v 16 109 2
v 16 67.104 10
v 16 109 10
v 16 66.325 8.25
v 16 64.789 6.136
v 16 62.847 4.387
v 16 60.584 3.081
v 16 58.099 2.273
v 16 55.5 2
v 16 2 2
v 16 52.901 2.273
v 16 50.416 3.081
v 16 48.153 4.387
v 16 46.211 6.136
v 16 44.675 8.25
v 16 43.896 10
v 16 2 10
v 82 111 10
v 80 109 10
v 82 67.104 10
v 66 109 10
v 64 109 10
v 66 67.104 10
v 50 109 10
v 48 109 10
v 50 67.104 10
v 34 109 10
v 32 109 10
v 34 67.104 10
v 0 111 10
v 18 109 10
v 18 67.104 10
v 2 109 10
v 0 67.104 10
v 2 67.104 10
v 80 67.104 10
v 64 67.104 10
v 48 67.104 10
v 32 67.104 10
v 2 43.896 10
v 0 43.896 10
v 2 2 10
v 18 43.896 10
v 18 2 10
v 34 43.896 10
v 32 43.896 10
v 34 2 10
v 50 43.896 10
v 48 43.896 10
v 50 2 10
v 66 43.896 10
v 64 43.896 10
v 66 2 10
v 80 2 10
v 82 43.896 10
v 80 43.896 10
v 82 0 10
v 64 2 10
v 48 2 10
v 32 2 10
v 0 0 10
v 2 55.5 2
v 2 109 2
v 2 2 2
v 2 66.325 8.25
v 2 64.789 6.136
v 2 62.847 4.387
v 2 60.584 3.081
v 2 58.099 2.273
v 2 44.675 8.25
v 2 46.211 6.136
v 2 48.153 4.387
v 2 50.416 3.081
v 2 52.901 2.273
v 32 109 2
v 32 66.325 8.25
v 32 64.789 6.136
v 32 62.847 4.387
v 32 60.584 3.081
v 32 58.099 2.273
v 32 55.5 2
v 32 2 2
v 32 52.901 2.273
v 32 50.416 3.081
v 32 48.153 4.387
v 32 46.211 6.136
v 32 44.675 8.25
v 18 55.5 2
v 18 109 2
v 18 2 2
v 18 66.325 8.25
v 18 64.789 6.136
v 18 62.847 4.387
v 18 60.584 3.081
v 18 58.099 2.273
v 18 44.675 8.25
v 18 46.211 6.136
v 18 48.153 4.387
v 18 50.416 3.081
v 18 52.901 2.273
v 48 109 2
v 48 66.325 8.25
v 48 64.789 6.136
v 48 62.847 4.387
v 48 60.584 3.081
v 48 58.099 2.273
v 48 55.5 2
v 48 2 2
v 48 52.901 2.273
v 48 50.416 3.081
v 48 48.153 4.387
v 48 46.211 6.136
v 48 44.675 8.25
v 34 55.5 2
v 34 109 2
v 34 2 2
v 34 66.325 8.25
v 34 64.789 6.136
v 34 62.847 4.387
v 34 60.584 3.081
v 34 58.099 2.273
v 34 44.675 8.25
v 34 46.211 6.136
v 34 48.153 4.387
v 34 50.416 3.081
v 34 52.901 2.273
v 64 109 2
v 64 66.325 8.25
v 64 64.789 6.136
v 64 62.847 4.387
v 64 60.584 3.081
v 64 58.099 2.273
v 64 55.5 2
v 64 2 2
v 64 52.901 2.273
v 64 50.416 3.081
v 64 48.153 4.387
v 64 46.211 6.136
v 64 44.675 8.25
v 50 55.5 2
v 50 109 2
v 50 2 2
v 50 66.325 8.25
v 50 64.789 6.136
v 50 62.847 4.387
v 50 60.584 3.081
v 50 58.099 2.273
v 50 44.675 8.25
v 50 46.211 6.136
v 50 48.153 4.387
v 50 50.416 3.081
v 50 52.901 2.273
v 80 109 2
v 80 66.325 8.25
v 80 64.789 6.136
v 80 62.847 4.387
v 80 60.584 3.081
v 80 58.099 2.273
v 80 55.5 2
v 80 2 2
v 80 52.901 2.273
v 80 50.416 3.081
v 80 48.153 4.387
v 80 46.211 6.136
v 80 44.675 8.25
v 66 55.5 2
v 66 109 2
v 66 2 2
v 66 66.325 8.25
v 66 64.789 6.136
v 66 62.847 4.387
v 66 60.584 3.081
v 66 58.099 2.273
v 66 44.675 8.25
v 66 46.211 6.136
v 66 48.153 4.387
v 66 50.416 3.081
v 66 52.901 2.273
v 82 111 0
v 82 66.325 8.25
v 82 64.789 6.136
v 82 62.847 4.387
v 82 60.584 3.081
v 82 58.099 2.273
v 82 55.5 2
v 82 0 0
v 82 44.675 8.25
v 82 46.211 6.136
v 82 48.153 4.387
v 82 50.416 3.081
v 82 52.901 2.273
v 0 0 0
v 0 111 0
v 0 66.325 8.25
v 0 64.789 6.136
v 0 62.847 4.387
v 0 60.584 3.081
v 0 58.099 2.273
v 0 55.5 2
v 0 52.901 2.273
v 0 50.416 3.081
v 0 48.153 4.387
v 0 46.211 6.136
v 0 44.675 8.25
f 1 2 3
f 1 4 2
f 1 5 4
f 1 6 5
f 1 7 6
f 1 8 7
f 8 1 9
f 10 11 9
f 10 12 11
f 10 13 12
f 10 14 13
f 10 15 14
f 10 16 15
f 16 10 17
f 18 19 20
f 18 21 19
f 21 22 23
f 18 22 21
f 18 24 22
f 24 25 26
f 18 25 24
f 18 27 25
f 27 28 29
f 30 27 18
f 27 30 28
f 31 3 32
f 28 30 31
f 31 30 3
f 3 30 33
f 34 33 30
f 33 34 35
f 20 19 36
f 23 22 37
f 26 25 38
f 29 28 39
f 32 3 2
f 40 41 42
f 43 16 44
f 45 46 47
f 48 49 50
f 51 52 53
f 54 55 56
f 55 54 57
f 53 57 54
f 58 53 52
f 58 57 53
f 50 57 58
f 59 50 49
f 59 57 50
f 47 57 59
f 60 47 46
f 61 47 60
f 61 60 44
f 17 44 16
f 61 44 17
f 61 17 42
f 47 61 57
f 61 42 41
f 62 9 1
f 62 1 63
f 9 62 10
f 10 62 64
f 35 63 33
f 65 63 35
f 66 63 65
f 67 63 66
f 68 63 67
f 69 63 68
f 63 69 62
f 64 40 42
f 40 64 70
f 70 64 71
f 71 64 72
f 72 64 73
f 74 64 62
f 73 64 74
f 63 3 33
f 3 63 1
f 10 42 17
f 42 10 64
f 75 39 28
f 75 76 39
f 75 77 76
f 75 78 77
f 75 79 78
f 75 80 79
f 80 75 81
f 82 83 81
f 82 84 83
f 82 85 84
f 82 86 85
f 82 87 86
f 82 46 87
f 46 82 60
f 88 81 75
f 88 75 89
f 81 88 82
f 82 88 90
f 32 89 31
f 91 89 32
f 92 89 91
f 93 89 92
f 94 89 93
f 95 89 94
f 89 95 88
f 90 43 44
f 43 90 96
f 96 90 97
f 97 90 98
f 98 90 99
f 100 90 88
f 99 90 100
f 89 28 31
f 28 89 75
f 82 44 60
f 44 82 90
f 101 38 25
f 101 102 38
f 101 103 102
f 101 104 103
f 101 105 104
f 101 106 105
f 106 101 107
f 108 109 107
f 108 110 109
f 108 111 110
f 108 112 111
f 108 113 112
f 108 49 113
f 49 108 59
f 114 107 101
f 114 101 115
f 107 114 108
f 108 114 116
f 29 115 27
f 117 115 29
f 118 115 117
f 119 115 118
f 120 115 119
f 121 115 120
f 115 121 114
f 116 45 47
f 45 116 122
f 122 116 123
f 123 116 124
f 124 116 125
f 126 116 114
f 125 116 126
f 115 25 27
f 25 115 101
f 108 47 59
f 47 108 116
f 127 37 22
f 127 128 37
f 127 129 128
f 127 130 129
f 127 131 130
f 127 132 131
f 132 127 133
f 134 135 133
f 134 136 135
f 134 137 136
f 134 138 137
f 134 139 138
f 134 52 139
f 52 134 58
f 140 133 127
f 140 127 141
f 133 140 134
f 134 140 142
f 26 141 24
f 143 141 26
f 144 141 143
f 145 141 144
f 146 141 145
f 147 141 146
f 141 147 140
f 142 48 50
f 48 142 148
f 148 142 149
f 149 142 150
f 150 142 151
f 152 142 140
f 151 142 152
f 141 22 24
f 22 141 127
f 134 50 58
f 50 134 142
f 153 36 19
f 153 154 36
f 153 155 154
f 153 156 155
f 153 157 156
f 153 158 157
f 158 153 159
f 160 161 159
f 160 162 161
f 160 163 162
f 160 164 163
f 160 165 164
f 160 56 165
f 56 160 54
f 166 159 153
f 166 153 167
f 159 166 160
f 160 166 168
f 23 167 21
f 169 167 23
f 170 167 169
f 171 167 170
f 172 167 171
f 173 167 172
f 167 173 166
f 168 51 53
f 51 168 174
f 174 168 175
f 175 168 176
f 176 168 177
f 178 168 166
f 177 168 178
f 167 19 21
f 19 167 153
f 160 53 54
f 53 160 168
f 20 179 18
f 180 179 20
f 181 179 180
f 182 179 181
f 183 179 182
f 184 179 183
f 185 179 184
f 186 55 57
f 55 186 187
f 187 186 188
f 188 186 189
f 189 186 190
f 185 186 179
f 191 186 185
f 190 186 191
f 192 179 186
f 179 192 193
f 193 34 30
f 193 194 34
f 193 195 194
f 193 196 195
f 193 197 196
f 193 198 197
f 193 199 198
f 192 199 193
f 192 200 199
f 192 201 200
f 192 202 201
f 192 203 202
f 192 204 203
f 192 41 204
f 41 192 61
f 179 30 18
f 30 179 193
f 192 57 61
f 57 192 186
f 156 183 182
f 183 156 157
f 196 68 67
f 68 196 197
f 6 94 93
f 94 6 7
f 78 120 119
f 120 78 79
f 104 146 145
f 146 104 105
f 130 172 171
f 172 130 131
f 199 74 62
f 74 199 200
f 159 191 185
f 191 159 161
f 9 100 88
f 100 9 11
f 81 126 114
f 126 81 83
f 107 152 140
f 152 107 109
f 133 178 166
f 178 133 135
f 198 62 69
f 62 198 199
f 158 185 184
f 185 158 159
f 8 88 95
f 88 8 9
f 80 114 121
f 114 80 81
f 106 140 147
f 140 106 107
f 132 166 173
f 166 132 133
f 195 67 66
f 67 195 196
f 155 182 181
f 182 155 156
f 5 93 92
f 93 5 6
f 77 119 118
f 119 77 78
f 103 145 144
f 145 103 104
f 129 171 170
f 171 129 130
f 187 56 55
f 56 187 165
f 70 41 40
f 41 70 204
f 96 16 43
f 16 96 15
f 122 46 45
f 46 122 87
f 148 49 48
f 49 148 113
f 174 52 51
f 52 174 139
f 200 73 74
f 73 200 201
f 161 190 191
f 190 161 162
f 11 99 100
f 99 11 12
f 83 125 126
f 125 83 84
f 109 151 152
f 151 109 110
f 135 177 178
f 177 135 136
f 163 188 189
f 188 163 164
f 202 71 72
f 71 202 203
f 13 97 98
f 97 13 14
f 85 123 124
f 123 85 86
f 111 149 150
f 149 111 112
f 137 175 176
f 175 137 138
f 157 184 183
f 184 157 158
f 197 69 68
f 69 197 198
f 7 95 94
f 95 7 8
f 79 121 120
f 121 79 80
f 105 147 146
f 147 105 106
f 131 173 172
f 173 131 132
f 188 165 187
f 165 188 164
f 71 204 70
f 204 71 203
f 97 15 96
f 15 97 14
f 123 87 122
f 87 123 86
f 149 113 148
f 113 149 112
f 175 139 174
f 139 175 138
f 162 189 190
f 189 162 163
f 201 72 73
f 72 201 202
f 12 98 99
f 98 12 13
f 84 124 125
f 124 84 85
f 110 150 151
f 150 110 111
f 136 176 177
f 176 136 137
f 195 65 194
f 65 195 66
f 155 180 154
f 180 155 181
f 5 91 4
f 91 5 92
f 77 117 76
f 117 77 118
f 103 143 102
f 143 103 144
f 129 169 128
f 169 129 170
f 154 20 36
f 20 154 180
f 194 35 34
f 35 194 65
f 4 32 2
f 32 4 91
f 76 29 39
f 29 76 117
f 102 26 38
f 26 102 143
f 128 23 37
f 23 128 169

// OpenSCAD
// length of the longest bit
bay_height = 107;

// width of bits side by side
bay_width = 14;

// diameter of thickest bit
bay_depth = 8;

// number of bays
number_bays = 5;

// thickness of all the walls including the base
wall_thickness = 2;

// label height (0 for no label space)
label_height = 0;

// do some preliminary calulations
total_width = wall_thickness+number_bays*(bay_width+wall_thickness);
total_height = (label_height==0) ? bay_height+2*wall_thickness : label_height+bay_height+3*wall_thickness;
total_depth = bay_depth+wall_thickness;

label_depth = 1;
difference(){
    // make a base
    cube([total_width,total_height,total_depth]);
    
    // cut out the bays
    y1_move = (label_height==0) ? wall_thickness : 2*wall_thickness+label_height;
    for(i=[0:1:number_bays-1]){ 
        translate([wall_thickness+i*(bay_width+wall_thickness), y1_move, wall_thickness])cube([bay_width,bay_height, bay_depth]);   
    }
    
    // make a finger slot
    y2_move = (label_height == 0) ? total_height/2 : label_height+2*wall_thickness+bay_height/2;
    
    translate([0,y2_move,12.5+wall_thickness])rotate([0,90,0])cylinder(d=25,h=total_width);
    
    //make a label slot
    if(label_height!=0)
    translate([wall_thickness, wall_thickness,total_depth-label_depth])cube([total_width-2*wall_thickness,label_height,label_depth]);
    
}
